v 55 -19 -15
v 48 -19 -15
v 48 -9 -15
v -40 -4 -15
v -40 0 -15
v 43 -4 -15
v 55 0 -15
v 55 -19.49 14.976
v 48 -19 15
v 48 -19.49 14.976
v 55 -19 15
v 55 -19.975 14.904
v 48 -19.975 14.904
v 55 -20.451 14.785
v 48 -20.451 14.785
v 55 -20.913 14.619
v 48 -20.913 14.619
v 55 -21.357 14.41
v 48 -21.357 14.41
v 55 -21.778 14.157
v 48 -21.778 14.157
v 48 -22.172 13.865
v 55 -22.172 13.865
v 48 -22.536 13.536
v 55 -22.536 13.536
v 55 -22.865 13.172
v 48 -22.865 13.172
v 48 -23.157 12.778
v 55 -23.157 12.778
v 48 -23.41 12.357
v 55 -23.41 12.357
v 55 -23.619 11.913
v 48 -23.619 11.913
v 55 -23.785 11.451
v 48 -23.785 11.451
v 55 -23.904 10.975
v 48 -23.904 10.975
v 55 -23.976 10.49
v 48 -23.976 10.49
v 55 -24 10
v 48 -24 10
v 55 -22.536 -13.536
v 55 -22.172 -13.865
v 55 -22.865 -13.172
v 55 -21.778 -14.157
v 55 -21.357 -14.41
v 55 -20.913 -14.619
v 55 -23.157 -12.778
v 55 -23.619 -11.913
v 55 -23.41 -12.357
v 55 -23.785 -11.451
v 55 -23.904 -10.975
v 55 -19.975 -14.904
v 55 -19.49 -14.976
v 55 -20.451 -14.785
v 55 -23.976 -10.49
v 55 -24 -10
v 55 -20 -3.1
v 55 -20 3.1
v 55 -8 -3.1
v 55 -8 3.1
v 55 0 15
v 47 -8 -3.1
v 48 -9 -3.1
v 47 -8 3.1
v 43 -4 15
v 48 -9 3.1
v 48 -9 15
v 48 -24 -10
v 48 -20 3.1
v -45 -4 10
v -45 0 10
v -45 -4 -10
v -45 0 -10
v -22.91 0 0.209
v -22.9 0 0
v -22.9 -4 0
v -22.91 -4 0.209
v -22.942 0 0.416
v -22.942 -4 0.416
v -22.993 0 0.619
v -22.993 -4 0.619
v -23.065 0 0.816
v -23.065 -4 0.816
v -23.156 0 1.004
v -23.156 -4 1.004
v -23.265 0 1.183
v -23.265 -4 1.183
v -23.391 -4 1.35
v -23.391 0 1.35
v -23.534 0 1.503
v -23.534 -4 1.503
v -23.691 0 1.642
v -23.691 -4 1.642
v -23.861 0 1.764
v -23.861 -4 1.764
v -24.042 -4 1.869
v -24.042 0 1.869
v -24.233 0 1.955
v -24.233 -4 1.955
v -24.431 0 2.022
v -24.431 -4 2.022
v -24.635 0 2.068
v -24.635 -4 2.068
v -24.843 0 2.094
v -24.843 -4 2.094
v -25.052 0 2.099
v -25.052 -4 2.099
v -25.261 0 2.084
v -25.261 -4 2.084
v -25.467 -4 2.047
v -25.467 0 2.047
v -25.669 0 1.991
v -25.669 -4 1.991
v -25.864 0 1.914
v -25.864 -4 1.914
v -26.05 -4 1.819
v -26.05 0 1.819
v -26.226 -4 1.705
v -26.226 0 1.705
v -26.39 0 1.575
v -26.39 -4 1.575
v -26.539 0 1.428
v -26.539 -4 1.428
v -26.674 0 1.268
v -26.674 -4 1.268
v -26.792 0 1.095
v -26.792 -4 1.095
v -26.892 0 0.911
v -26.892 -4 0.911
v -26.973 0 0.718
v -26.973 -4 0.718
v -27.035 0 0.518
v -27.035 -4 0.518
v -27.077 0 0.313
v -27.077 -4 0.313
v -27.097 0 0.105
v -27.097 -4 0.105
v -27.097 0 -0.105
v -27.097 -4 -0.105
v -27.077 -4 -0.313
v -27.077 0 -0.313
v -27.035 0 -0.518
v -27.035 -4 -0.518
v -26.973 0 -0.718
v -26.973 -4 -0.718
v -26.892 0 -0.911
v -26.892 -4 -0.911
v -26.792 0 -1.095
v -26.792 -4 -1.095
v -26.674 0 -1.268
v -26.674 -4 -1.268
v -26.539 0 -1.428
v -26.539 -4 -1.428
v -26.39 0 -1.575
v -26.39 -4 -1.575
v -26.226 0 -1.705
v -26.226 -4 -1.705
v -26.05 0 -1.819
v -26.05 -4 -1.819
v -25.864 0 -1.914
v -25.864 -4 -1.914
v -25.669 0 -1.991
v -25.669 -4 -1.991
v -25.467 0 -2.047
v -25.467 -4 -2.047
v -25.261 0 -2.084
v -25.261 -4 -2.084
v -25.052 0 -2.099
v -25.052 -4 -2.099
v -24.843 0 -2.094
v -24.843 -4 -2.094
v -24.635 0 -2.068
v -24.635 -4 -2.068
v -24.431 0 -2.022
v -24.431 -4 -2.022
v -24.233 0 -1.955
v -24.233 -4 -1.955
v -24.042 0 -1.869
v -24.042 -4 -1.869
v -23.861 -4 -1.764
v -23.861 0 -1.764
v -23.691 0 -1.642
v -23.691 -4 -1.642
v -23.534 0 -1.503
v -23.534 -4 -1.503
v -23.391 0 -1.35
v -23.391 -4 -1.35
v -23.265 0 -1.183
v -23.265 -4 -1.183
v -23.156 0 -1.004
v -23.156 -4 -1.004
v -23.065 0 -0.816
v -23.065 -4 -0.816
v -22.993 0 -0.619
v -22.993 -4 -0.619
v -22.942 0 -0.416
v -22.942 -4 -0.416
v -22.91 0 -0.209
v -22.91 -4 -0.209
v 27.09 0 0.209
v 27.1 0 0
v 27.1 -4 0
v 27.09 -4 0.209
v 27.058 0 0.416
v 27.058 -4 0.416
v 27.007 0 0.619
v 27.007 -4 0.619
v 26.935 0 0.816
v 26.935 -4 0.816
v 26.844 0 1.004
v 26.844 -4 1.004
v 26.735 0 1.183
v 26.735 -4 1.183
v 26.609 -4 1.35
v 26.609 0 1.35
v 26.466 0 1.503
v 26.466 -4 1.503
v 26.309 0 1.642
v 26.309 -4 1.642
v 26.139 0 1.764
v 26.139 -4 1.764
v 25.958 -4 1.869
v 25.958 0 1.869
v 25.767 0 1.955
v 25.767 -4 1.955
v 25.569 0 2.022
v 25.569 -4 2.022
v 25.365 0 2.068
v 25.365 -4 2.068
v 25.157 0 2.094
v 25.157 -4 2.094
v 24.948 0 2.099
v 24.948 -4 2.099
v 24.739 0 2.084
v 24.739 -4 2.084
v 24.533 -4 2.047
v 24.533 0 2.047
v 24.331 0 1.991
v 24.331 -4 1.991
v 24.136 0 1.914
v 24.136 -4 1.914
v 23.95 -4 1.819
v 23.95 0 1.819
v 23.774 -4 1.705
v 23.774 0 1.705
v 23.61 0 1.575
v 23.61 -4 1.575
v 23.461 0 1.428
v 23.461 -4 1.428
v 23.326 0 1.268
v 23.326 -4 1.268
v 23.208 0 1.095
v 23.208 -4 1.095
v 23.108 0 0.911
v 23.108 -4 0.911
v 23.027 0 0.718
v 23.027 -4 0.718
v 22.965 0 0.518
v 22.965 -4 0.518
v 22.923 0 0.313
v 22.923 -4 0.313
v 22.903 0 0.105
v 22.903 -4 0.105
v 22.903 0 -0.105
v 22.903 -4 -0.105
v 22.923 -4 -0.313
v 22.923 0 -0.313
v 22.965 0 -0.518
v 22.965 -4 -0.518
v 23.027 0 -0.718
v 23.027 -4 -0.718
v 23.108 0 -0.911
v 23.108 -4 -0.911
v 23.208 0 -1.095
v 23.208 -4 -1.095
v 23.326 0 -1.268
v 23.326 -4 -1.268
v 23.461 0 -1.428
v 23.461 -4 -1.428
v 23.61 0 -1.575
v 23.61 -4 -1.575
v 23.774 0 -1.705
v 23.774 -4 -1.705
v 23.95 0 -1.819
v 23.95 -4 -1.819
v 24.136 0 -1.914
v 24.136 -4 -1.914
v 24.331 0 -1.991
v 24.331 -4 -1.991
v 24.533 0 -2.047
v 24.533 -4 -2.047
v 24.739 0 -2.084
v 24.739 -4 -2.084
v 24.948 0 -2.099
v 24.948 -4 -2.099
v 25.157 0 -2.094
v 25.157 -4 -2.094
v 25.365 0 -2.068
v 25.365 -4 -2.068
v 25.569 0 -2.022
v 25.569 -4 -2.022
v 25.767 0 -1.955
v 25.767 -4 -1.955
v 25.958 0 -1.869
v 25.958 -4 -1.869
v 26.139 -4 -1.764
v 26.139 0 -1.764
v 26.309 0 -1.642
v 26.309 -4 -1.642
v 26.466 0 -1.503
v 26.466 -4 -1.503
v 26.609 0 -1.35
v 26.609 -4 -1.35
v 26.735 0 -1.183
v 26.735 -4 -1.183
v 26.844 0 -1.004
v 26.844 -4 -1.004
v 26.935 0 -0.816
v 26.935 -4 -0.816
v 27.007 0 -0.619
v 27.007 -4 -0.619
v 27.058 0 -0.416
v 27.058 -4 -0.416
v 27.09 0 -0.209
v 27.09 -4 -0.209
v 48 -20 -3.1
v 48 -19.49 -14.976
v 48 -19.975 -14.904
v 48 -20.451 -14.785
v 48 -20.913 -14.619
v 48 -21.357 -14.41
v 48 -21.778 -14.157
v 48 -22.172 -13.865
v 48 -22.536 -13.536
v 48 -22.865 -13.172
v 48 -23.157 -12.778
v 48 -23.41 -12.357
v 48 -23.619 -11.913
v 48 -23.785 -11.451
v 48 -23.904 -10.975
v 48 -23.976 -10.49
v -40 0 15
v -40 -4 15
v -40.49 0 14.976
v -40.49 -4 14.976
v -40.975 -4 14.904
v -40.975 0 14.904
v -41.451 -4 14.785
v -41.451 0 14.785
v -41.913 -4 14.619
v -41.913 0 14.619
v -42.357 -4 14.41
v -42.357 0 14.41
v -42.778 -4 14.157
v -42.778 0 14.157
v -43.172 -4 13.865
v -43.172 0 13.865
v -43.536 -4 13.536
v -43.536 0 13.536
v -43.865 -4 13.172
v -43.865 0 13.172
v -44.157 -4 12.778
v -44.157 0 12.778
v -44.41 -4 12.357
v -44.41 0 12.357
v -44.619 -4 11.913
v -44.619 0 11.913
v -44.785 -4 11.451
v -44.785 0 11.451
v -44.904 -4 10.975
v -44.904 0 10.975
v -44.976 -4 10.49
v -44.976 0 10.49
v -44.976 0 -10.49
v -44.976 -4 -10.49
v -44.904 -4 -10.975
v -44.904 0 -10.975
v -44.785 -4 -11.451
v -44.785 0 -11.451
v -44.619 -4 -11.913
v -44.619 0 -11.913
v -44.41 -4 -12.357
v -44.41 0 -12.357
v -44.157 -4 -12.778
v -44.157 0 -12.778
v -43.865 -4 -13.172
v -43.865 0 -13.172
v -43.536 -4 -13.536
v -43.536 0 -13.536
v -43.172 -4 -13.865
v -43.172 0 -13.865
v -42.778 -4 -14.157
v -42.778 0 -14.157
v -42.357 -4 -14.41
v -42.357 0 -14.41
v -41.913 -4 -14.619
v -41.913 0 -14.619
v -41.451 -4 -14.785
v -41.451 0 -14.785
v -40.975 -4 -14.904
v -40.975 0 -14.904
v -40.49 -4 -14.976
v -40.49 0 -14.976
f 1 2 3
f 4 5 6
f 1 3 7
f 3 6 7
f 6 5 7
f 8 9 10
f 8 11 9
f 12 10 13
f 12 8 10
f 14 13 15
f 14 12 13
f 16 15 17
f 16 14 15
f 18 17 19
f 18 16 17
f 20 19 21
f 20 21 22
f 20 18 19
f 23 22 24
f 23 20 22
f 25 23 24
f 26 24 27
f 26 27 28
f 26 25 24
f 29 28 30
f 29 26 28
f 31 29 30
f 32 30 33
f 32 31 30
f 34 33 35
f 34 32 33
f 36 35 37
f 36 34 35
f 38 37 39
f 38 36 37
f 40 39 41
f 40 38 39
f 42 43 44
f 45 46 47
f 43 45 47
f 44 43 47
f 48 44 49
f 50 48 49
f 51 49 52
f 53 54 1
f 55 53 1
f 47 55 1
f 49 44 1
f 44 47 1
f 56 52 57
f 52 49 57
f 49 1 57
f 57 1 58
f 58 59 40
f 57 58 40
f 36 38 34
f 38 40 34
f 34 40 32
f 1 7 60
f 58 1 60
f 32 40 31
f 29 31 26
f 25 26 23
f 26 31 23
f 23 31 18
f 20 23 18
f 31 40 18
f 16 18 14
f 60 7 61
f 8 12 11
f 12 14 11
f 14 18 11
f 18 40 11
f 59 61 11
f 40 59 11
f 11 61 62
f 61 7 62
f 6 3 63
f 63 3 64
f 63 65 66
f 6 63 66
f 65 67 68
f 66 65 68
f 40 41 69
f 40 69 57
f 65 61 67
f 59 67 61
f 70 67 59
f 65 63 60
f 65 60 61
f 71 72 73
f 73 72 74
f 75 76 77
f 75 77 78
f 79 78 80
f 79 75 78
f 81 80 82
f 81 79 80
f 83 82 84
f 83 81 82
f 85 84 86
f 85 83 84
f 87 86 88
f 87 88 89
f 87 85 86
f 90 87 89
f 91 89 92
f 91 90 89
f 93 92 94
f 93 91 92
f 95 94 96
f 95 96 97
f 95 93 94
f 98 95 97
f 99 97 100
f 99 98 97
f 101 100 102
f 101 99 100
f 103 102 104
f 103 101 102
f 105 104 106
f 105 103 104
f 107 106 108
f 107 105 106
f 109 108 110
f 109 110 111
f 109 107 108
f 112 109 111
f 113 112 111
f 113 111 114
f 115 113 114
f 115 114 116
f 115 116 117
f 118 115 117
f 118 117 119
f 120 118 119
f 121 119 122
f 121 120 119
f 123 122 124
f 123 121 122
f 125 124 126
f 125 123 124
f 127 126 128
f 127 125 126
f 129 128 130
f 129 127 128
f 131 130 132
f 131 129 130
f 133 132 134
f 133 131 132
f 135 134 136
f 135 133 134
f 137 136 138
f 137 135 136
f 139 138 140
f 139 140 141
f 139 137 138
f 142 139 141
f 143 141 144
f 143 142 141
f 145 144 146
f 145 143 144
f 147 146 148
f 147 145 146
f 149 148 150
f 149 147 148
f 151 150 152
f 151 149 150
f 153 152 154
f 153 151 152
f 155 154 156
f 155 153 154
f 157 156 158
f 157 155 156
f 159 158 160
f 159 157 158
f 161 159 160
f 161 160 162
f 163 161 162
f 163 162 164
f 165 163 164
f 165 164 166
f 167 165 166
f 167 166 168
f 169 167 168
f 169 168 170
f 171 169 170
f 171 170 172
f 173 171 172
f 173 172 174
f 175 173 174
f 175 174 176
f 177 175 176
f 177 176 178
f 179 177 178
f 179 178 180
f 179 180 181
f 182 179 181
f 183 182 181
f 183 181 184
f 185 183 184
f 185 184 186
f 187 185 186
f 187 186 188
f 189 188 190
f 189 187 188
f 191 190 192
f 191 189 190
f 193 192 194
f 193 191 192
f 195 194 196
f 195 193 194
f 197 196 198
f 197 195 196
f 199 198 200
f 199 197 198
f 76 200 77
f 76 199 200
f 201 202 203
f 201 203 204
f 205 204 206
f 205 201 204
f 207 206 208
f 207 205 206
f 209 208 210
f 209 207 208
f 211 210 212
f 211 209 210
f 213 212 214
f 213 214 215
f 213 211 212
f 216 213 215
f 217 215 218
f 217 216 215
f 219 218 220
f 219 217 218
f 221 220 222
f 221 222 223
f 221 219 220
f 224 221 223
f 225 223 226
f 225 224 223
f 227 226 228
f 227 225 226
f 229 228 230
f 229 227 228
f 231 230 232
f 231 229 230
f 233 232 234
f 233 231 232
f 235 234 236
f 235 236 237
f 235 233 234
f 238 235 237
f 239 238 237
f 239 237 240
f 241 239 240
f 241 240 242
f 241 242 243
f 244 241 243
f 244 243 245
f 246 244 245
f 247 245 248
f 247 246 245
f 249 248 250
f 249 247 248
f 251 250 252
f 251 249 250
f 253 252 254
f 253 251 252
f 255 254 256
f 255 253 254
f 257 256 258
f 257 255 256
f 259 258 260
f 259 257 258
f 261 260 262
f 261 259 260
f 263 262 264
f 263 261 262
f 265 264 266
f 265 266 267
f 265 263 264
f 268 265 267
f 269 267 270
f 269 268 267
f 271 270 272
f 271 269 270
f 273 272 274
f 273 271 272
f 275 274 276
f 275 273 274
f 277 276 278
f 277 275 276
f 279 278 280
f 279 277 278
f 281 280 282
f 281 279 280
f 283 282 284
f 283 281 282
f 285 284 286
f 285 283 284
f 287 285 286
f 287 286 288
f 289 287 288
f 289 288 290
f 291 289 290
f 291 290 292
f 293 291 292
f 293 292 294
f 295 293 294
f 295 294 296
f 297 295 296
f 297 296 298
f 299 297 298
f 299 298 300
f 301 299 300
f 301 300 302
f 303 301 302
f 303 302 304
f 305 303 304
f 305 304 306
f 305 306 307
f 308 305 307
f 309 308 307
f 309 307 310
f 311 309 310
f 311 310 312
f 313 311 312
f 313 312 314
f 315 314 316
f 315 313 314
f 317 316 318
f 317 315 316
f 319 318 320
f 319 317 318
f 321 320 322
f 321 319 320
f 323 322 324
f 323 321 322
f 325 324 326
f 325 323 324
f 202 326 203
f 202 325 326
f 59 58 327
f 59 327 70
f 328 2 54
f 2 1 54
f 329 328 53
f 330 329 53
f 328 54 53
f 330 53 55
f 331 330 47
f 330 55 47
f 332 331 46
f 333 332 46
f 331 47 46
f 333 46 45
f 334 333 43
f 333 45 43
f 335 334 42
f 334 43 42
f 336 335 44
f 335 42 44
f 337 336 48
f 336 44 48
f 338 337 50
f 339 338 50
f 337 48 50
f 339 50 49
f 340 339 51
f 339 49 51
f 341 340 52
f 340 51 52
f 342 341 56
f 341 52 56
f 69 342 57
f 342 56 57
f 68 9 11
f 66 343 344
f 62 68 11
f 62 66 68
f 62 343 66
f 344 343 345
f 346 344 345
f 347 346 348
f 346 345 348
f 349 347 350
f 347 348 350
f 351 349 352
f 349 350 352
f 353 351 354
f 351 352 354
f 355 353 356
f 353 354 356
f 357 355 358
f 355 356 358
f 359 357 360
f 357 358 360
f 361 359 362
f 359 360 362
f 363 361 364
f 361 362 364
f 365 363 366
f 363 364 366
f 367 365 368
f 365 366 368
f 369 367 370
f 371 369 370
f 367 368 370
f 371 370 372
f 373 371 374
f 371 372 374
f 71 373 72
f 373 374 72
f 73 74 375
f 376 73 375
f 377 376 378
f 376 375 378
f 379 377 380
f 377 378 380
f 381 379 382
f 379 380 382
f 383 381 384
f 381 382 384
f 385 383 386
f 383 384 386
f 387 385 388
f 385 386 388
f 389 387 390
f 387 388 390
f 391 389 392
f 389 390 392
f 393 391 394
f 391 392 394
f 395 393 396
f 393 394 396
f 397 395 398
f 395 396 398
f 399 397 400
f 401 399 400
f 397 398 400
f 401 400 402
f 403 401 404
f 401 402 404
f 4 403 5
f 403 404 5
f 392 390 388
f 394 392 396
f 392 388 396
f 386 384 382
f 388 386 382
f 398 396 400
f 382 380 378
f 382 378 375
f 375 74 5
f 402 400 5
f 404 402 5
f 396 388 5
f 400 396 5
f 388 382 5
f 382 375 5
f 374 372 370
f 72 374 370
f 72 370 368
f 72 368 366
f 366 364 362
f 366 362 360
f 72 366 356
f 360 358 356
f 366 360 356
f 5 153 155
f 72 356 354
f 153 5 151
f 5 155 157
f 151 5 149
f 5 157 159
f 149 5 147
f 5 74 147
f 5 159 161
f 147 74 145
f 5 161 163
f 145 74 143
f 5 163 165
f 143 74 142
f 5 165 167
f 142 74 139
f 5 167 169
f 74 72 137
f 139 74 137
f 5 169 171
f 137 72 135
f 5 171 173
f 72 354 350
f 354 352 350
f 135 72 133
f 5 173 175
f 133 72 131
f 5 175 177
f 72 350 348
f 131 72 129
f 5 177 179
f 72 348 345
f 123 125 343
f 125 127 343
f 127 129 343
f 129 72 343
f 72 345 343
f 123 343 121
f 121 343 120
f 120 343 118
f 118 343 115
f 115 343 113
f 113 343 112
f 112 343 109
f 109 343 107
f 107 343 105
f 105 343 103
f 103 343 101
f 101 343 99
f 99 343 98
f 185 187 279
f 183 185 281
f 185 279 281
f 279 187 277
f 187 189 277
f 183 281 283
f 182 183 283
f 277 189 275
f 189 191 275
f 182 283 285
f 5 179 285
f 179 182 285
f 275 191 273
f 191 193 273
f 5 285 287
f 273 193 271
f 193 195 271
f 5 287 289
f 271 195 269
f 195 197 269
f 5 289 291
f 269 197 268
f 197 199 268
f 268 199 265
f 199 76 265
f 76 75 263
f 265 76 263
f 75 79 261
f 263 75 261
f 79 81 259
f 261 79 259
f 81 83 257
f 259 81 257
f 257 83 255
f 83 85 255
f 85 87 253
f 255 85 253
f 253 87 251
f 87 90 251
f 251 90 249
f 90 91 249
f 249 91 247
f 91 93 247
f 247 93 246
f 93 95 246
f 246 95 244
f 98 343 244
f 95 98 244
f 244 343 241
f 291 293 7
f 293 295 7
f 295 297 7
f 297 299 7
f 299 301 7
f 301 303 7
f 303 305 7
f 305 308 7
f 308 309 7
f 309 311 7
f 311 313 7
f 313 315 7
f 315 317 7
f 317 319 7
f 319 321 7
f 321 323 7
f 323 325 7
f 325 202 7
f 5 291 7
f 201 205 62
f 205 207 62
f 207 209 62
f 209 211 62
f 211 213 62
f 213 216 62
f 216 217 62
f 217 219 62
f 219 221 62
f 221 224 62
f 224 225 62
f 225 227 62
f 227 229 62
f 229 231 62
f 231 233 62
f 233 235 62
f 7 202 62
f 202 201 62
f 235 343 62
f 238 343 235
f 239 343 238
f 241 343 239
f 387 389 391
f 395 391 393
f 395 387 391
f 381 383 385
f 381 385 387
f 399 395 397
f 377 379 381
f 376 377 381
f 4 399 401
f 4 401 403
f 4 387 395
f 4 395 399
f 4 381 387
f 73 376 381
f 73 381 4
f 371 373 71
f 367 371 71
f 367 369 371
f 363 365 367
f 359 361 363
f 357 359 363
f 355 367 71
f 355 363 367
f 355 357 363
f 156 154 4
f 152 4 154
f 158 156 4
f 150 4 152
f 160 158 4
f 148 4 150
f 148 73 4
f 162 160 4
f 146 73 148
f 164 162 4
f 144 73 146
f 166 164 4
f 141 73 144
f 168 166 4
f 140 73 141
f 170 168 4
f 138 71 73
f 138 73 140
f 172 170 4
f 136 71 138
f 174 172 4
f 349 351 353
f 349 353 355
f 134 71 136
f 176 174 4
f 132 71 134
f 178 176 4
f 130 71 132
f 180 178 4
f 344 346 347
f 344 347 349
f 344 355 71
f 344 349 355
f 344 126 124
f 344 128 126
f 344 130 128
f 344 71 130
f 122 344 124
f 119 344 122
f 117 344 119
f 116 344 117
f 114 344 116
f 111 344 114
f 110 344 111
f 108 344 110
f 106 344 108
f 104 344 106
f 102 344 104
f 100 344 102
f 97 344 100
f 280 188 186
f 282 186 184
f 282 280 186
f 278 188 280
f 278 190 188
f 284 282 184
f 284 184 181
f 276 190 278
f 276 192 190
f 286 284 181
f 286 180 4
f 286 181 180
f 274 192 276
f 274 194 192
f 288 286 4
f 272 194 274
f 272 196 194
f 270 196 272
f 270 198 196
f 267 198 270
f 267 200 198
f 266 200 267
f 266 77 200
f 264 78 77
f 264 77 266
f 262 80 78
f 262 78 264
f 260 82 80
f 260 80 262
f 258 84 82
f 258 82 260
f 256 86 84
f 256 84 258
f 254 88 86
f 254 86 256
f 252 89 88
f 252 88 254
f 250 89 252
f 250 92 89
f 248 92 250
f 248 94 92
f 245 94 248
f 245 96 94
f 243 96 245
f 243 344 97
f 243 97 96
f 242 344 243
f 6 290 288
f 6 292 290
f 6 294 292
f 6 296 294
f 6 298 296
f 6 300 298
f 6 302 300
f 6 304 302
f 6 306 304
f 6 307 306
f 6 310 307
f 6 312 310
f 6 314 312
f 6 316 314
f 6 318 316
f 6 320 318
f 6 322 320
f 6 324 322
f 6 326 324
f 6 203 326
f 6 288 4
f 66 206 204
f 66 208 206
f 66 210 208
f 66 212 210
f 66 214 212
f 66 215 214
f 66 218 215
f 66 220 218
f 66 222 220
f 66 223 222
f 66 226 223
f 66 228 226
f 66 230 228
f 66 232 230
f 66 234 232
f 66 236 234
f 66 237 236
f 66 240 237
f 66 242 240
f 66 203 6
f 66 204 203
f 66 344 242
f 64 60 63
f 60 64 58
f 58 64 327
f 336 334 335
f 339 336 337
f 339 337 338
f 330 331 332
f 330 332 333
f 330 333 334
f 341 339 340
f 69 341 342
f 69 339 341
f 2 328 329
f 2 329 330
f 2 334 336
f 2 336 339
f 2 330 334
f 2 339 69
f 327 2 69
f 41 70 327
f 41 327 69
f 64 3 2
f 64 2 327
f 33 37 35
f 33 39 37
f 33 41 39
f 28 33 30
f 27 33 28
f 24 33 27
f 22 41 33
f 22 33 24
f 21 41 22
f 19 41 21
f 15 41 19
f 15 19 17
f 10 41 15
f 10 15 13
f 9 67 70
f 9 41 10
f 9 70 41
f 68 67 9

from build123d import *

# Parameters (mm, degrees)
F0_R     = 2.1
F1_DEPTH = 4
F2_W     = 7
F2_H     = 30
F3_DEPTH = 20
F5_W     = 5
F5_H     = 30
F6_DEPTH = 5
F7_SIZE  = 4.99999
F4_W     = 12
F4_H     = 6.2
F8_DEPTH = 10.8
F9_R     = 5


# Not quite as in the source:
# - a fillet or chamfer is up to 0.001 mm smaller than in the source, because OpenCascade refuses the exact size


with BuildPart() as f1:
    # F0 (on Front) → F1 (new body)
    with BuildSketch(Plane.XZ):
        with BuildLine():
            Line((55, 15), (-40, 15))
            ThreePointArc((-40, 15), (-43.5355339059, 13.5355339059), (-45, 10))
            Line((-45, 10), (-45, -10))
            ThreePointArc((-45, -10), (-43.5355339059, -13.5355339059), (-40, -15))
            Line((-40, -15), (55, -15))
            Line((55, -15), (55, 15))
        make_face()
        with Locations((-25, 0)):
            Circle(F0_R, mode=Mode.SUBTRACT)
        with Locations((25, 0)):
            Circle(F0_R, mode=Mode.SUBTRACT)
    extrude(amount=F1_DEPTH)

    # F2 (on face) → F3 (join)
    with BuildSketch(Plane.XZ.offset(4)):
        with Locations((51.5, 0)):
            Rectangle(F2_W, F2_H)
    extrude(amount=F3_DEPTH)

    # F5 (on face) → F6 (join)
    with BuildSketch(Plane.XZ.offset(4)):
        with Locations((45.5, 0)):
            Rectangle(F5_W, F5_H)
    extrude(amount=F6_DEPTH)

    # F7 (size 5 in the source; OpenCascade refuses exactly that, so slightly less here)
    f7_edges = [f1.edges().sort_by_distance(p)[0] for p in [
        (43, -9, 0),
    ]]
    chamfer(f7_edges, length=F7_SIZE)

    # F4 (on face) → F8 (cut, symmetric)
    with BuildSketch(Plane(origin=(48, 0, 0), x_dir=(0, -1, 0), z_dir=(-1, 0, 0))):
        with Locations((14, 0)):
            Rectangle(F4_W, F4_H)
    extrude(amount=F8_DEPTH, both=True, mode=Mode.SUBTRACT)

    # F9
    f9_edges = [f1.edges().sort_by_distance(p)[0] for p in [
        (51.5, -24, 15),
        (51.5, -24, -15),
    ]]
    fillet(f9_edges, radius=F9_R)


solid = f1.part
